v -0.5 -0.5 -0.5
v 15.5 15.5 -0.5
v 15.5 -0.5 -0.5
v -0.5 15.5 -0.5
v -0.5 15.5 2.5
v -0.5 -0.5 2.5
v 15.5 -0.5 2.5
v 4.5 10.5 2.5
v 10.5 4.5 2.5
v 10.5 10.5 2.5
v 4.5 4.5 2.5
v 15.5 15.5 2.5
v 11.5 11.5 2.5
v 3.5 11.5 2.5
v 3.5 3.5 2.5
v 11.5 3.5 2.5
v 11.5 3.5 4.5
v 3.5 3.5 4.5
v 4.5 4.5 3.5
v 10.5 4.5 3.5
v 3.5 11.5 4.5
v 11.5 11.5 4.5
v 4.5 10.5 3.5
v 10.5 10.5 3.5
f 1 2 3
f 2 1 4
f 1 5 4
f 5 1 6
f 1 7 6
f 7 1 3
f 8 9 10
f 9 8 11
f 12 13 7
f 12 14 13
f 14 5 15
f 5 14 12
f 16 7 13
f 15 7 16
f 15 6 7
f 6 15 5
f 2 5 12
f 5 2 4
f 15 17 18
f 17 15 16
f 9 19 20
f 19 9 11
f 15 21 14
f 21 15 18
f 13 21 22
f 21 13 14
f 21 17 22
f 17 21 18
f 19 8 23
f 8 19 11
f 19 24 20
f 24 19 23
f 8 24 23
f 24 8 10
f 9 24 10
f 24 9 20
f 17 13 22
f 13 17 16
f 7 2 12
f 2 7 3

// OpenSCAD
union() {
    translate([0, 0, 0]) color("brown") cube([1, 1, 1],center=true);
    translate([0, 0, 1]) color("brown") cube([1, 1, 1],center=true);
    translate([0, 0, 2]) color("brown") cube([1, 1, 1],center=true);
    translate([0, 1, 0]) color("brown") cube([1, 1, 1],center=true);
    translate([0, 1, 1]) color("brown") cube([1, 1, 1],center=true);
    translate([0, 1, 2]) color("brown") cube([1, 1, 1],center=true);
    translate([0, 2, 0]) color("brown") cube([1, 1, 1],center=true);
    translate([0, 2, 1]) color("brown") cube([1, 1, 1],center=true);
    translate([0, 2, 2]) color("brown") cube([1, 1, 1],center=true);
    translate([0, 3, 0]) color("brown") cube([1, 1, 1],center=true);
    translate([0, 3, 1]) color("brown") cube([1, 1, 1],center=true);
    translate([0, 3, 2]) color("brown") cube([1, 1, 1],center=true);
    translate([0, 4, 0]) color("brown") cube([1, 1, 1],center=true);
    translate([0, 4, 1]) color("brown") cube([1, 1, 1],center=true);
    translate([0, 4, 2]) color("brown") cube([1, 1, 1],center=true);
    translate([0, 5, 0]) color("brown") cube([1, 1, 1],center=true);
    translate([0, 5, 1]) color("brown") cube([1, 1, 1],center=true);
    translate([0, 5, 2]) color("brown") cube([1, 1, 1],center=true);
    translate([0, 6, 0]) color("brown") cube([1, 1, 1],center=true);
    translate([0, 6, 1]) color("brown") cube([1, 1, 1],center=true);
    translate([0, 6, 2]) color("brown") cube([1, 1, 1],center=true);
    translate([0, 7, 0]) color("brown") cube([1, 1, 1],center=true);
    translate([0, 7, 1]) color("brown") cube([1, 1, 1],center=true);
    translate([0, 7, 2]) color("brown") cube([1, 1, 1],center=true);
    translate([0, 8, 0]) color("brown") cube([1, 1, 1],center=true);
    translate([0, 8, 1]) color("brown") cube([1, 1, 1],center=true);
    translate([0, 8, 2]) color("brown") cube([1, 1, 1],center=true);
    translate([0, 9, 0]) color("brown") cube([1, 1, 1],center=true);
    translate([0, 9, 1]) color("brown") cube([1, 1, 1],center=true);
    translate([0, 9, 2]) color("brown") cube([1, 1, 1],center=true);
    translate([0, 10, 0]) color("brown") cube([1, 1, 1],center=true);
    translate([0, 10, 1]) color("brown") cube([1, 1, 1],center=true);
    translate([0, 10, 2]) color("brown") cube([1, 1, 1],center=true);
    translate([0, 11, 0]) color("brown") cube([1, 1, 1],center=true);
    translate([0, 11, 1]) color("brown") cube([1, 1, 1],center=true);
    translate([0, 11, 2]) color("brown") cube([1, 1, 1],center=true);
    translate([0, 12, 0]) color("brown") cube([1, 1, 1],center=true);
    translate([0, 12, 1]) color("brown") cube([1, 1, 1],center=true);
    translate([0, 12, 2]) color("brown") cube([1, 1, 1],center=true);
    translate([0, 13, 0]) color("brown") cube([1, 1, 1],center=true);
    translate([0, 13, 1]) color("brown") cube([1, 1, 1],center=true);
    translate([0, 13, 2]) color("brown") cube([1, 1, 1],center=true);
    translate([0, 14, 0]) color("brown") cube([1, 1, 1],center=true);
    translate([0, 14, 1]) color("brown") cube([1, 1, 1],center=true);
    translate([0, 14, 2]) color("brown") cube([1, 1, 1],center=true);
    translate([0, 15, 0]) color("brown") cube([1, 1, 1],center=true);
    translate([0, 15, 1]) color("brown") cube([1, 1, 1],center=true);
    translate([0, 15, 2]) color("brown") cube([1, 1, 1],center=true);
    translate([1, 0, 0]) color("brown") cube([1, 1, 1],center=true);
    translate([1, 0, 1]) color("brown") cube([1, 1, 1],center=true);
    translate([1, 0, 2]) color("brown") cube([1, 1, 1],center=true);
    translate([1, 1, 0]) color("brown") cube([1, 1, 1],center=true);
    translate([1, 1, 1]) color("brown") cube([1, 1, 1],center=true);
    translate([1, 1, 2]) color("brown") cube([1, 1, 1],center=true);
    translate([1, 2, 0]) color("brown") cube([1, 1, 1],center=true);
    translate([1, 2, 1]) color("brown") cube([1, 1, 1],center=true);
    translate([1, 2, 2]) color("brown") cube([1, 1, 1],center=true);
    translate([1, 3, 0]) color("brown") cube([1, 1, 1],center=true);
    translate([1, 3, 1]) color("brown") cube([1, 1, 1],center=true);
    translate([1, 3, 2]) color("brown") cube([1, 1, 1],center=true);
    translate([1, 4, 0]) color("brown") cube([1, 1, 1],center=true);
    translate([1, 4, 1]) color("brown") cube([1, 1, 1],center=true);
    translate([1, 4, 2]) color("brown") cube([1, 1, 1],center=true);
    translate([1, 5, 0]) color("brown") cube([1, 1, 1],center=true);
    translate([1, 5, 1]) color("brown") cube([1, 1, 1],center=true);
    translate([1, 5, 2]) color("brown") cube([1, 1, 1],center=true);
    translate([1, 6, 0]) color("brown") cube([1, 1, 1],center=true);
    translate([1, 6, 1]) color("brown") cube([1, 1, 1],center=true);
    translate([1, 6, 2]) color("brown") cube([1, 1, 1],center=true);
    translate([1, 7, 0]) color("brown") cube([1, 1, 1],center=true);
    translate([1, 7, 1]) color("brown") cube([1, 1, 1],center=true);
    translate([1, 7, 2]) color("brown") cube([1, 1, 1],center=true);
    translate([1, 8, 0]) color("brown") cube([1, 1, 1],center=true);
    translate([1, 8, 1]) color("brown") cube([1, 1, 1],center=true);
    translate([1, 8, 2]) color("brown") cube([1, 1, 1],center=true);
    translate([1, 9, 0]) color("brown") cube([1, 1, 1],center=true);
    translate([1, 9, 1]) color("brown") cube([1, 1, 1],center=true);
    translate([1, 9, 2]) color("brown") cube([1, 1, 1],center=true);
    translate([1, 10, 0]) color("brown") cube([1, 1, 1],center=true);
    translate([1, 10, 1]) color("brown") cube([1, 1, 1],center=true);
    translate([1, 10, 2]) color("brown") cube([1, 1, 1],center=true);
    translate([1, 11, 0]) color("brown") cube([1, 1, 1],center=true);
    translate([1, 11, 1]) color("brown") cube([1, 1, 1],center=true);
    translate([1, 11, 2]) color("brown") cube([1, 1, 1],center=true);
    translate([1, 12, 0]) color("brown") cube([1, 1, 1],center=true);
    translate([1, 12, 1]) color("brown") cube([1, 1, 1],center=true);
    translate([1, 12, 2]) color("brown") cube([1, 1, 1],center=true);
    translate([1, 13, 0]) color("brown") cube([1, 1, 1],center=true);
    translate([1, 13, 1]) color("brown") cube([1, 1, 1],center=true);
    translate([1, 13, 2]) color("brown") cube([1, 1, 1],center=true);
    translate([1, 14, 0]) color("brown") cube([1, 1, 1],center=true);
    translate([1, 14, 1]) color("brown") cube([1, 1, 1],center=true);
    translate([1, 14, 2]) color("brown") cube([1, 1, 1],center=true);
    translate([1, 15, 0]) color("brown") cube([1, 1, 1],center=true);
    translate([1, 15, 1]) color("brown") cube([1, 1, 1],center=true);
    translate([1, 15, 2]) color("brown") cube([1, 1, 1],center=true);
    translate([2, 0, 0]) color("brown") cube([1, 1, 1],center=true);
    translate([2, 0, 1]) color("brown") cube([1, 1, 1],center=true);
    translate([2, 0, 2]) color("brown") cube([1, 1, 1],center=true);
    translate([2, 1, 0]) color("brown") cube([1, 1, 1],center=true);
    translate([2, 1, 1]) color("brown") cube([1, 1, 1],center=true);
    translate([2, 1, 2]) color("brown") cube([1, 1, 1],center=true);
    translate([2, 2, 0]) color("brown") cube([1, 1, 1],center=true);
    translate([2, 2, 1]) color("brown") cube([1, 1, 1],center=true);
    translate([2, 2, 2]) color("brown") cube([1, 1, 1],center=true);
    translate([2, 3, 0]) color("brown") cube([1, 1, 1],center=true);
    translate([2, 3, 1]) color("brown") cube([1, 1, 1],center=true);
    translate([2, 3, 2]) color("brown") cube([1, 1, 1],center=true);
    translate([2, 4, 0]) color("brown") cube([1, 1, 1],center=true);
    translate([2, 4, 1]) color("brown") cube([1, 1, 1],center=true);
    translate([2, 4, 2]) color("brown") cube([1, 1, 1],center=true);
    translate([2, 5, 0]) color("brown") cube([1, 1, 1],center=true);
    translate([2, 5, 1]) color("brown") cube([1, 1, 1],center=true);
    translate([2, 5, 2]) color("brown") cube([1, 1, 1],center=true);
    translate([2, 6, 0]) color("brown") cube([1, 1, 1],center=true);
    translate([2, 6, 1]) color("brown") cube([1, 1, 1],center=true);
    translate([2, 6, 2]) color("brown") cube([1, 1, 1],center=true);
    translate([2, 7, 0]) color("brown") cube([1, 1, 1],center=true);
    translate([2, 7, 1]) color("brown") cube([1, 1, 1],center=true);
    translate([2, 7, 2]) color("brown") cube([1, 1, 1],center=true);
    translate([2, 8, 0]) color("brown") cube([1, 1, 1],center=true);
    translate([2, 8, 1]) color("brown") cube([1, 1, 1],center=true);
    translate([2, 8, 2]) color("brown") cube([1, 1, 1],center=true);
    translate([2, 9, 0]) color("brown") cube([1, 1, 1],center=true);
    translate([2, 9, 1]) color("brown") cube([1, 1, 1],center=true);
    translate([2, 9, 2]) color("brown") cube([1, 1, 1],center=true);
    translate([2, 10, 0]) color("brown") cube([1, 1, 1],center=true);
    translate([2, 10, 1]) color("brown") cube([1, 1, 1],center=true);
    translate([2, 10, 2]) color("brown") cube([1, 1, 1],center=true);
    translate([2, 11, 0]) color("brown") cube([1, 1, 1],center=true);
    translate([2, 11, 1]) color("brown") cube([1, 1, 1],center=true);
    translate([2, 11, 2]) color("brown") cube([1, 1, 1],center=true);
    translate([2, 12, 0]) color("brown") cube([1, 1, 1],center=true);
    translate([2, 12, 1]) color("brown") cube([1, 1, 1],center=true);
    translate([2, 12, 2]) color("brown") cube([1, 1, 1],center=true);
    translate([2, 13, 0]) color("brown") cube([1, 1, 1],center=true);
    translate([2, 13, 1]) color("brown") cube([1, 1, 1],center=true);
    translate([2, 13, 2]) color("brown") cube([1, 1, 1],center=true);
    translate([2, 14, 0]) color("brown") cube([1, 1, 1],center=true);
    translate([2, 14, 1]) color("brown") cube([1, 1, 1],center=true);
    translate([2, 14, 2]) color("brown") cube([1, 1, 1],center=true);
    translate([2, 15, 0]) color("brown") cube([1, 1, 1],center=true);
    translate([2, 15, 1]) color("brown") cube([1, 1, 1],center=true);
    translate([2, 15, 2]) color("brown") cube([1, 1, 1],center=true);
    translate([3, 0, 0]) color("brown") cube([1, 1, 1],center=true);
    translate([3, 0, 1]) color("brown") cube([1, 1, 1],center=true);
    translate([3, 0, 2]) color("brown") cube([1, 1, 1],center=true);
    translate([3, 1, 0]) color("brown") cube([1, 1, 1],center=true);
    translate([3, 1, 1]) color("brown") cube([1, 1, 1],center=true);
    translate([3, 1, 2]) color("brown") cube([1, 1, 1],center=true);
    translate([3, 2, 0]) color("brown") cube([1, 1, 1],center=true);
    translate([3, 2, 1]) color("brown") cube([1, 1, 1],center=true);
    translate([3, 2, 2]) color("brown") cube([1, 1, 1],center=true);
    translate([3, 3, 0]) color("brown") cube([1, 1, 1],center=true);
    translate([3, 3, 1]) color("brown") cube([1, 1, 1],center=true);
    translate([3, 3, 2]) color("brown") cube([1, 1, 1],center=true);
    translate([3, 4, 0]) color("brown") cube([1, 1, 1],center=true);
    translate([3, 4, 1]) color("brown") cube([1, 1, 1],center=true);
    translate([3, 4, 2]) color("brown") cube([1, 1, 1],center=true);
    translate([3, 5, 0]) color("brown") cube([1, 1, 1],center=true);
    translate([3, 5, 1]) color("brown") cube([1, 1, 1],center=true);
    translate([3, 5, 2]) color("brown") cube([1, 1, 1],center=true);
    translate([3, 6, 0]) color("brown") cube([1, 1, 1],center=true);
    translate([3, 6, 1]) color("brown") cube([1, 1, 1],center=true);
    translate([3, 6, 2]) color("brown") cube([1, 1, 1],center=true);
    translate([3, 7, 0]) color("brown") cube([1, 1, 1],center=true);
    translate([3, 7, 1]) color("brown") cube([1, 1, 1],center=true);
    translate([3, 7, 2]) color("brown") cube([1, 1, 1],center=true);
    translate([3, 8, 0]) color("brown") cube([1, 1, 1],center=true);
    translate([3, 8, 1]) color("brown") cube([1, 1, 1],center=true);
    translate([3, 8, 2]) color("brown") cube([1, 1, 1],center=true);
    translate([3, 9, 0]) color("brown") cube([1, 1, 1],center=true);
    translate([3, 9, 1]) color("brown") cube([1, 1, 1],center=true);
    translate([3, 9, 2]) color("brown") cube([1, 1, 1],center=true);
    translate([3, 10, 0]) color("brown") cube([1, 1, 1],center=true);
    translate([3, 10, 1]) color("brown") cube([1, 1, 1],center=true);
    translate([3, 10, 2]) color("brown") cube([1, 1, 1],center=true);
    translate([3, 11, 0]) color("brown") cube([1, 1, 1],center=true);
    translate([3, 11, 1]) color("brown") cube([1, 1, 1],center=true);
    translate([3, 11, 2]) color("brown") cube([1, 1, 1],center=true);
    translate([3, 12, 0]) color("brown") cube([1, 1, 1],center=true);
    translate([3, 12, 1]) color("brown") cube([1, 1, 1],center=true);
    translate([3, 12, 2]) color("brown") cube([1, 1, 1],center=true);
    translate([3, 13, 0]) color("brown") cube([1, 1, 1],center=true);
    translate([3, 13, 1]) color("brown") cube([1, 1, 1],center=true);
    translate([3, 13, 2]) color("brown") cube([1, 1, 1],center=true);
    translate([3, 14, 0]) color("brown") cube([1, 1, 1],center=true);
    translate([3, 14, 1]) color("brown") cube([1, 1, 1],center=true);
    translate([3, 14, 2]) color("brown") cube([1, 1, 1],center=true);
    translate([3, 15, 0]) color("brown") cube([1, 1, 1],center=true);
    translate([3, 15, 1]) color("brown") cube([1, 1, 1],center=true);
    translate([3, 15, 2]) color("brown") cube([1, 1, 1],center=true);
    translate([4, 0, 0]) color("brown") cube([1, 1, 1],center=true);
    translate([4, 0, 1]) color("brown") cube([1, 1, 1],center=true);
    translate([4, 0, 2]) color("brown") cube([1, 1, 1],center=true);
    translate([4, 1, 0]) color("brown") cube([1, 1, 1],center=true);
    translate([4, 1, 1]) color("brown") cube([1, 1, 1],center=true);
    translate([4, 1, 2]) color("brown") cube([1, 1, 1],center=true);
    translate([4, 2, 0]) color("brown") cube([1, 1, 1],center=true);
    translate([4, 2, 1]) color("brown") cube([1, 1, 1],center=true);
    translate([4, 2, 2]) color("brown") cube([1, 1, 1],center=true);
    translate([4, 3, 0]) color("brown") cube([1, 1, 1],center=true);
    translate([4, 3, 1]) color("brown") cube([1, 1, 1],center=true);
    translate([4, 3, 2]) color("brown") cube([1, 1, 1],center=true);
    translate([4, 4, 0]) color("brown") cube([1, 1, 1],center=true);
    translate([4, 4, 1]) color("brown") cube([1, 1, 1],center=true);
    translate([4, 4, 2]) color("brown") cube([1, 1, 1],center=true);
    translate([4, 4, 3]) color("brown") cube([1, 1, 1],center=true);
    translate([4, 4, 4]) color("brown") cube([1, 1, 1],center=true);
    translate([4, 5, 0]) color("brown") cube([1, 1, 1],center=true);
    translate([4, 5, 1]) color("brown") cube([1, 1, 1],center=true);
    translate([4, 5, 2]) color("brown") cube([1, 1, 1],center=true);
    translate([4, 5, 3]) color("brown") cube([1, 1, 1],center=true);
    translate([4, 5, 4]) color("brown") cube([1, 1, 1],center=true);
    translate([4, 6, 0]) color("brown") cube([1, 1, 1],center=true);
    translate([4, 6, 1]) color("brown") cube([1, 1, 1],center=true);
    translate([4, 6, 2]) color("brown") cube([1, 1, 1],center=true);
    translate([4, 6, 3]) color("brown") cube([1, 1, 1],center=true);
    translate([4, 6, 4]) color("brown") cube([1, 1, 1],center=true);
    translate([4, 7, 0]) color("brown") cube([1, 1, 1],center=true);
    translate([4, 7, 1]) color("brown") cube([1, 1, 1],center=true);
    translate([4, 7, 2]) color("brown") cube([1, 1, 1],center=true);
    translate([4, 7, 3]) color("brown") cube([1, 1, 1],center=true);
    translate([4, 7, 4]) color("brown") cube([1, 1, 1],center=true);
    translate([4, 8, 0]) color("brown") cube([1, 1, 1],center=true);
    translate([4, 8, 1]) color("brown") cube([1, 1, 1],center=true);
    translate([4, 8, 2]) color("brown") cube([1, 1, 1],center=true);
    translate([4, 8, 3]) color("brown") cube([1, 1, 1],center=true);
    translate([4, 8, 4]) color("brown") cube([1, 1, 1],center=true);
    translate([4, 9, 0]) color("brown") cube([1, 1, 1],center=true);
    translate([4, 9, 1]) color("brown") cube([1, 1, 1],center=true);
    translate([4, 9, 2]) color("brown") cube([1, 1, 1],center=true);
    translate([4, 9, 3]) color("brown") cube([1, 1, 1],center=true);
    translate([4, 9, 4]) color("brown") cube([1, 1, 1],center=true);
    translate([4, 10, 0]) color("brown") cube([1, 1, 1],center=true);
    translate([4, 10, 1]) color("brown") cube([1, 1, 1],center=true);
    translate([4, 10, 2]) color("brown") cube([1, 1, 1],center=true);
    translate([4, 10, 3]) color("brown") cube([1, 1, 1],center=true);
    translate([4, 10, 4]) color("brown") cube([1, 1, 1],center=true);
    translate([4, 11, 0]) color("brown") cube([1, 1, 1],center=true);
    translate([4, 11, 1]) color("brown") cube([1, 1, 1],center=true);
    translate([4, 11, 2]) color("brown") cube([1, 1, 1],center=true);
    translate([4, 11, 3]) color("brown") cube([1, 1, 1],center=true);
    translate([4, 11, 4]) color("brown") cube([1, 1, 1],center=true);
    translate([4, 12, 0]) color("brown") cube([1, 1, 1],center=true);
    translate([4, 12, 1]) color("brown") cube([1, 1, 1],center=true);
    translate([4, 12, 2]) color("brown") cube([1, 1, 1],center=true);
    translate([4, 13, 0]) color("brown") cube([1, 1, 1],center=true);
    translate([4, 13, 1]) color("brown") cube([1, 1, 1],center=true);
    translate([4, 13, 2]) color("brown") cube([1, 1, 1],center=true);
    translate([4, 14, 0]) color("brown") cube([1, 1, 1],center=true);
    translate([4, 14, 1]) color("brown") cube([1, 1, 1],center=true);
    translate([4, 14, 2]) color("brown") cube([1, 1, 1],center=true);
    translate([4, 15, 0]) color("brown") cube([1, 1, 1],center=true);
    translate([4, 15, 1]) color("brown") cube([1, 1, 1],center=true);
    translate([4, 15, 2]) color("brown") cube([1, 1, 1],center=true);
    translate([5, 0, 0]) color("brown") cube([1, 1, 1],center=true);
    translate([5, 0, 1]) color("brown") cube([1, 1, 1],center=true);
    translate([5, 0, 2]) color("brown") cube([1, 1, 1],center=true);
    translate([5, 1, 0]) color("brown") cube([1, 1, 1],center=true);
    translate([5, 1, 1]) color("brown") cube([1, 1, 1],center=true);
    translate([5, 1, 2]) color("brown") cube([1, 1, 1],center=true);
    translate([5, 2, 0]) color("brown") cube([1, 1, 1],center=true);
    translate([5, 2, 1]) color("brown") cube([1, 1, 1],center=true);
    translate([5, 2, 2]) color("brown") cube([1, 1, 1],center=true);
    translate([5, 3, 0]) color("brown") cube([1, 1, 1],center=true);
    translate([5, 3, 1]) color("brown") cube([1, 1, 1],center=true);
    translate([5, 3, 2]) color("brown") cube([1, 1, 1],center=true);
    translate([5, 4, 0]) color("brown") cube([1, 1, 1],center=true);
    translate([5, 4, 1]) color("brown") cube([1, 1, 1],center=true);
    translate([5, 4, 2]) color("brown") cube([1, 1, 1],center=true);
    translate([5, 4, 3]) color("brown") cube([1, 1, 1],center=true);
    translate([5, 4, 4]) color("brown") cube([1, 1, 1],center=true);
    translate([5, 5, 0]) color("brown") cube([1, 1, 1],center=true);
    translate([5, 5, 1]) color("brown") cube([1, 1, 1],center=true);
    translate([5, 5, 2]) color("brown") cube([1, 1, 1],center=true);
    translate([5, 5, 4]) color("brown") cube([1, 1, 1],center=true);
    translate([5, 6, 0]) color("brown") cube([1, 1, 1],center=true);
    translate([5, 6, 1]) color("brown") cube([1, 1, 1],center=true);
    translate([5, 6, 2]) color("brown") cube([1, 1, 1],center=true);
    translate([5, 6, 4]) color("brown") cube([1, 1, 1],center=true);
    translate([5, 7, 0]) color("brown") cube([1, 1, 1],center=true);
    translate([5, 7, 1]) color("brown") cube([1, 1, 1],center=true);
    translate([5, 7, 2]) color("brown") cube([1, 1, 1],center=true);
    translate([5, 7, 4]) color("brown") cube([1, 1, 1],center=true);
    translate([5, 8, 0]) color("brown") cube([1, 1, 1],center=true);
    translate([5, 8, 1]) color("brown") cube([1, 1, 1],center=true);
    translate([5, 8, 2]) color("brown") cube([1, 1, 1],center=true);
    translate([5, 8, 4]) color("brown") cube([1, 1, 1],center=true);
    translate([5, 9, 0]) color("brown") cube([1, 1, 1],center=true);
    translate([5, 9, 1]) color("brown") cube([1, 1, 1],center=true);
    translate([5, 9, 2]) color("brown") cube([1, 1, 1],center=true);
    translate([5, 9, 4]) color("brown") cube([1, 1, 1],center=true);
    translate([5, 10, 0]) color("brown") cube([1, 1, 1],center=true);
    translate([5, 10, 1]) color("brown") cube([1, 1, 1],center=true);
    translate([5, 10, 2]) color("brown") cube([1, 1, 1],center=true);
    translate([5, 10, 4]) color("brown") cube([1, 1, 1],center=true);
    translate([5, 11, 0]) color("brown") cube([1, 1, 1],center=true);
    translate([5, 11, 1]) color("brown") cube([1, 1, 1],center=true);
    translate([5, 11, 2]) color("brown") cube([1, 1, 1],center=true);
    translate([5, 11, 3]) color("brown") cube([1, 1, 1],center=true);
    translate([5, 11, 4]) color("brown") cube([1, 1, 1],center=true);
    translate([5, 12, 0]) color("brown") cube([1, 1, 1],center=true);
    translate([5, 12, 1]) color("brown") cube([1, 1, 1],center=true);
    translate([5, 12, 2]) color("brown") cube([1, 1, 1],center=true);
    translate([5, 13, 0]) color("brown") cube([1, 1, 1],center=true);
    translate([5, 13, 1]) color("brown") cube([1, 1, 1],center=true);
    translate([5, 13, 2]) color("brown") cube([1, 1, 1],center=true);
    translate([5, 14, 0]) color("brown") cube([1, 1, 1],center=true);
    translate([5, 14, 1]) color("brown") cube([1, 1, 1],center=true);
    translate([5, 14, 2]) color("brown") cube([1, 1, 1],center=true);
    translate([5, 15, 0]) color("brown") cube([1, 1, 1],center=true);
    translate([5, 15, 1]) color("brown") cube([1, 1, 1],center=true);
    translate([5, 15, 2]) color("brown") cube([1, 1, 1],center=true);
    translate([6, 0, 0]) color("brown") cube([1, 1, 1],center=true);
    translate([6, 0, 1]) color("brown") cube([1, 1, 1],center=true);
    translate([6, 0, 2]) color("brown") cube([1, 1, 1],center=true);
    translate([6, 1, 0]) color("brown") cube([1, 1, 1],center=true);
    translate([6, 1, 1]) color("brown") cube([1, 1, 1],center=true);
    translate([6, 1, 2]) color("brown") cube([1, 1, 1],center=true);
    translate([6, 2, 0]) color("brown") cube([1, 1, 1],center=true);
    translate([6, 2, 1]) color("brown") cube([1, 1, 1],center=true);
    translate([6, 2, 2]) color("brown") cube([1, 1, 1],center=true);
    translate([6, 3, 0]) color("brown") cube([1, 1, 1],center=true);
    translate([6, 3, 1]) color("brown") cube([1, 1, 1],center=true);
    translate([6, 3, 2]) color("brown") cube([1, 1, 1],center=true);
    translate([6, 4, 0]) color("brown") cube([1, 1, 1],center=true);
    translate([6, 4, 1]) color("brown") cube([1, 1, 1],center=true);
    translate([6, 4, 2]) color("brown") cube([1, 1, 1],center=true);
    translate([6, 4, 3]) color("brown") cube([1, 1, 1],center=true);
    translate([6, 4, 4]) color("brown") cube([1, 1, 1],center=true);
    translate([6, 5, 0]) color("brown") cube([1, 1, 1],center=true);
    translate([6, 5, 1]) color("brown") cube([1, 1, 1],center=true);
    translate([6, 5, 2]) color("brown") cube([1, 1, 1],center=true);
    translate([6, 5, 4]) color("brown") cube([1, 1, 1],center=true);
    translate([6, 6, 0]) color("brown") cube([1, 1, 1],center=true);
    translate([6, 6, 1]) color("brown") cube([1, 1, 1],center=true);
    translate([6, 6, 2]) color("brown") cube([1, 1, 1],center=true);
    translate([6, 6, 4]) color("brown") cube([1, 1, 1],center=true);
    translate([6, 7, 0]) color("brown") cube([1, 1, 1],center=true);
    translate([6, 7, 1]) color("brown") cube([1, 1, 1],center=true);
    translate([6, 7, 2]) color("brown") cube([1, 1, 1],center=true);
    translate([6, 7, 4]) color("brown") cube([1, 1, 1],center=true);
    translate([6, 8, 0]) color("brown") cube([1, 1, 1],center=true);
    translate([6, 8, 1]) color("brown") cube([1, 1, 1],center=true);
    translate([6, 8, 2]) color("brown") cube([1, 1, 1],center=true);
    translate([6, 8, 4]) color("brown") cube([1, 1, 1],center=true);
    translate([6, 9, 0]) color("brown") cube([1, 1, 1],center=true);
    translate([6, 9, 1]) color("brown") cube([1, 1, 1],center=true);
    translate([6, 9, 2]) color("brown") cube([1, 1, 1],center=true);
    translate([6, 9, 4]) color("brown") cube([1, 1, 1],center=true);
    translate([6, 10, 0]) color("brown") cube([1, 1, 1],center=true);
    translate([6, 10, 1]) color("brown") cube([1, 1, 1],center=true);
    translate([6, 10, 2]) color("brown") cube([1, 1, 1],center=true);
    translate([6, 10, 4]) color("brown") cube([1, 1, 1],center=true);
    translate([6, 11, 0]) color("brown") cube([1, 1, 1],center=true);
    translate([6, 11, 1]) color("brown") cube([1, 1, 1],center=true);
    translate([6, 11, 2]) color("brown") cube([1, 1, 1],center=true);
    translate([6, 11, 3]) color("brown") cube([1, 1, 1],center=true);
    translate([6, 11, 4]) color("brown") cube([1, 1, 1],center=true);
    translate([6, 12, 0]) color("brown") cube([1, 1, 1],center=true);
    translate([6, 12, 1]) color("brown") cube([1, 1, 1],center=true);
    translate([6, 12, 2]) color("brown") cube([1, 1, 1],center=true);
    translate([6, 13, 0]) color("brown") cube([1, 1, 1],center=true);
    translate([6, 13, 1]) color("brown") cube([1, 1, 1],center=true);
    translate([6, 13, 2]) color("brown") cube([1, 1, 1],center=true);
    translate([6, 14, 0]) color("brown") cube([1, 1, 1],center=true);
    translate([6, 14, 1]) color("brown") cube([1, 1, 1],center=true);
    translate([6, 14, 2]) color("brown") cube([1, 1, 1],center=true);
    translate([6, 15, 0]) color("brown") cube([1, 1, 1],center=true);
    translate([6, 15, 1]) color("brown") cube([1, 1, 1],center=true);
    translate([6, 15, 2]) color("brown") cube([1, 1, 1],center=true);
    translate([7, 0, 0]) color("brown") cube([1, 1, 1],center=true);
    translate([7, 0, 1]) color("brown") cube([1, 1, 1],center=true);
    translate([7, 0, 2]) color("brown") cube([1, 1, 1],center=true);
    translate([7, 1, 0]) color("brown") cube([1, 1, 1],center=true);
    translate([7, 1, 1]) color("brown") cube([1, 1, 1],center=true);
    translate([7, 1, 2]) color("brown") cube([1, 1, 1],center=true);
    translate([7, 2, 0]) color("brown") cube([1, 1, 1],center=true);
    translate([7, 2, 1]) color("brown") cube([1, 1, 1],center=true);
    translate([7, 2, 2]) color("brown") cube([1, 1, 1],center=true);
    translate([7, 3, 0]) color("brown") cube([1, 1, 1],center=true);
    translate([7, 3, 1]) color("brown") cube([1, 1, 1],center=true);
    translate([7, 3, 2]) color("brown") cube([1, 1, 1],center=true);
    translate([7, 4, 0]) color("brown") cube([1, 1, 1],center=true);
    translate([7, 4, 1]) color("brown") cube([1, 1, 1],center=true);
    translate([7, 4, 2]) color("brown") cube([1, 1, 1],center=true);
    translate([7, 4, 3]) color("brown") cube([1, 1, 1],center=true);
    translate([7, 4, 4]) color("brown") cube([1, 1, 1],center=true);
    translate([7, 5, 0]) color("brown") cube([1, 1, 1],center=true);
    translate([7, 5, 1]) color("brown") cube([1, 1, 1],center=true);
    translate([7, 5, 2]) color("brown") cube([1, 1, 1],center=true);
    translate([7, 5, 4]) color("brown") cube([1, 1, 1],center=true);
    translate([7, 6, 0]) color("brown") cube([1, 1, 1],center=true);
    translate([7, 6, 1]) color("brown") cube([1, 1, 1],center=true);
    translate([7, 6, 2]) color("brown") cube([1, 1, 1],center=true);
    translate([7, 6, 4]) color("brown") cube([1, 1, 1],center=true);
    translate([7, 7, 0]) color("brown") cube([1, 1, 1],center=true);
    translate([7, 7, 1]) color("brown") cube([1, 1, 1],center=true);
    translate([7, 7, 2]) color("brown") cube([1, 1, 1],center=true);
    translate([7, 7, 4]) color("brown") cube([1, 1, 1],center=true);
    translate([7, 8, 0]) color("brown") cube([1, 1, 1],center=true);
    translate([7, 8, 1]) color("brown") cube([1, 1, 1],center=true);
    translate([7, 8, 2]) color("brown") cube([1, 1, 1],center=true);
    translate([7, 8, 4]) color("brown") cube([1, 1, 1],center=true);
    translate([7, 9, 0]) color("brown") cube([1, 1, 1],center=true);
    translate([7, 9, 1]) color("brown") cube([1, 1, 1],center=true);
    translate([7, 9, 2]) color("brown") cube([1, 1, 1],center=true);
    translate([7, 9, 4]) color("brown") cube([1, 1, 1],center=true);
    translate([7, 10, 0]) color("brown") cube([1, 1, 1],center=true);
    translate([7, 10, 1]) color("brown") cube([1, 1, 1],center=true);
    translate([7, 10, 2]) color("brown") cube([1, 1, 1],center=true);
    translate([7, 10, 4]) color("brown") cube([1, 1, 1],center=true);
    translate([7, 11, 0]) color("brown") cube([1, 1, 1],center=true);
    translate([7, 11, 1]) color("brown") cube([1, 1, 1],center=true);
    translate([7, 11, 2]) color("brown") cube([1, 1, 1],center=true);
    translate([7, 11, 3]) color("brown") cube([1, 1, 1],center=true);
    translate([7, 11, 4]) color("brown") cube([1, 1, 1],center=true);
    translate([7, 12, 0]) color("brown") cube([1, 1, 1],center=true);
    translate([7, 12, 1]) color("brown") cube([1, 1, 1],center=true);
    translate([7, 12, 2]) color("brown") cube([1, 1, 1],center=true);
    translate([7, 13, 0]) color("brown") cube([1, 1, 1],center=true);
    translate([7, 13, 1]) color("brown") cube([1, 1, 1],center=true);
    translate([7, 13, 2]) color("brown") cube([1, 1, 1],center=true);
    translate([7, 14, 0]) color("brown") cube([1, 1, 1],center=true);
    translate([7, 14, 1]) color("brown") cube([1, 1, 1],center=true);
    translate([7, 14, 2]) color("brown") cube([1, 1, 1],center=true);
    translate([7, 15, 0]) color("brown") cube([1, 1, 1],center=true);
    translate([7, 15, 1]) color("brown") cube([1, 1, 1],center=true);
    translate([7, 15, 2]) color("brown") cube([1, 1, 1],center=true);
    translate([8, 0, 0]) color("brown") cube([1, 1, 1],center=true);
    translate([8, 0, 1]) color("brown") cube([1, 1, 1],center=true);
    translate([8, 0, 2]) color("brown") cube([1, 1, 1],center=true);
    translate([8, 1, 0]) color("brown") cube([1, 1, 1],center=true);
    translate([8, 1, 1]) color("brown") cube([1, 1, 1],center=true);
    translate([8, 1, 2]) color("brown") cube([1, 1, 1],center=true);
    translate([8, 2, 0]) color("brown") cube([1, 1, 1],center=true);
    translate([8, 2, 1]) color("brown") cube([1, 1, 1],center=true);
    translate([8, 2, 2]) color("brown") cube([1, 1, 1],center=true);
    translate([8, 3, 0]) color("brown") cube([1, 1, 1],center=true);
    translate([8, 3, 1]) color("brown") cube([1, 1, 1],center=true);
    translate([8, 3, 2]) color("brown") cube([1, 1, 1],center=true);
    translate([8, 4, 0]) color("brown") cube([1, 1, 1],center=true);
    translate([8, 4, 1]) color("brown") cube([1, 1, 1],center=true);
    translate([8, 4, 2]) color("brown") cube([1, 1, 1],center=true);
    translate([8, 4, 3]) color("brown") cube([1, 1, 1],center=true);
    translate([8, 4, 4]) color("brown") cube([1, 1, 1],center=true);
    translate([8, 5, 0]) color("brown") cube([1, 1, 1],center=true);
    translate([8, 5, 1]) color("brown") cube([1, 1, 1],center=true);
    translate([8, 5, 2]) color("brown") cube([1, 1, 1],center=true);
    translate([8, 5, 4]) color("brown") cube([1, 1, 1],center=true);
    translate([8, 6, 0]) color("brown") cube([1, 1, 1],center=true);
    translate([8, 6, 1]) color("brown") cube([1, 1, 1],center=true);
    translate([8, 6, 2]) color("brown") cube([1, 1, 1],center=true);
    translate([8, 6, 4]) color("brown") cube([1, 1, 1],center=true);
    translate([8, 7, 0]) color("brown") cube([1, 1, 1],center=true);
    translate([8, 7, 1]) color("brown") cube([1, 1, 1],center=true);
    translate([8, 7, 2]) color("brown") cube([1, 1, 1],center=true);
    translate([8, 7, 4]) color("brown") cube([1, 1, 1],center=true);
    translate([8, 8, 0]) color("brown") cube([1, 1, 1],center=true);
    translate([8, 8, 1]) color("brown") cube([1, 1, 1],center=true);
    translate([8, 8, 2]) color("brown") cube([1, 1, 1],center=true);
    translate([8, 8, 4]) color("brown") cube([1, 1, 1],center=true);
    translate([8, 9, 0]) color("brown") cube([1, 1, 1],center=true);
    translate([8, 9, 1]) color("brown") cube([1, 1, 1],center=true);
    translate([8, 9, 2]) color("brown") cube([1, 1, 1],center=true);
    translate([8, 9, 4]) color("brown") cube([1, 1, 1],center=true);
    translate([8, 10, 0]) color("brown") cube([1, 1, 1],center=true);
    translate([8, 10, 1]) color("brown") cube([1, 1, 1],center=true);
    translate([8, 10, 2]) color("brown") cube([1, 1, 1],center=true);
    translate([8, 10, 4]) color("brown") cube([1, 1, 1],center=true);
    translate([8, 11, 0]) color("brown") cube([1, 1, 1],center=true);
    translate([8, 11, 1]) color("brown") cube([1, 1, 1],center=true);
    translate([8, 11, 2]) color("brown") cube([1, 1, 1],center=true);
    translate([8, 11, 3]) color("brown") cube([1, 1, 1],center=true);
    translate([8, 11, 4]) color("brown") cube([1, 1, 1],center=true);
    translate([8, 12, 0]) color("brown") cube([1, 1, 1],center=true);
    translate([8, 12, 1]) color("brown") cube([1, 1, 1],center=true);
    translate([8, 12, 2]) color("brown") cube([1, 1, 1],center=true);
    translate([8, 13, 0]) color("brown") cube([1, 1, 1],center=true);
    translate([8, 13, 1]) color("brown") cube([1, 1, 1],center=true);
    translate([8, 13, 2]) color("brown") cube([1, 1, 1],center=true);
    translate([8, 14, 0]) color("brown") cube([1, 1, 1],center=true);
    translate([8, 14, 1]) color("brown") cube([1, 1, 1],center=true);
    translate([8, 14, 2]) color("brown") cube([1, 1, 1],center=true);
    translate([8, 15, 0]) color("brown") cube([1, 1, 1],center=true);
    translate([8, 15, 1]) color("brown") cube([1, 1, 1],center=true);
    translate([8, 15, 2]) color("brown") cube([1, 1, 1],center=true);
    translate([9, 0, 0]) color("brown") cube([1, 1, 1],center=true);
    translate([9, 0, 1]) color("brown") cube([1, 1, 1],center=true);
    translate([9, 0, 2]) color("brown") cube([1, 1, 1],center=true);
    translate([9, 1, 0]) color("brown") cube([1, 1, 1],center=true);
    translate([9, 1, 1]) color("brown") cube([1, 1, 1],center=true);
    translate([9, 1, 2]) color("brown") cube([1, 1, 1],center=true);
    translate([9, 2, 0]) color("brown") cube([1, 1, 1],center=true);
    translate([9, 2, 1]) color("brown") cube([1, 1, 1],center=true);
    translate([9, 2, 2]) color("brown") cube([1, 1, 1],center=true);
    translate([9, 3, 0]) color("brown") cube([1, 1, 1],center=true);
    translate([9, 3, 1]) color("brown") cube([1, 1, 1],center=true);
    translate([9, 3, 2]) color("brown") cube([1, 1, 1],center=true);
    translate([9, 4, 0]) color("brown") cube([1, 1, 1],center=true);
    translate([9, 4, 1]) color("brown") cube([1, 1, 1],center=true);
    translate([9, 4, 2]) color("brown") cube([1, 1, 1],center=true);
    translate([9, 4, 3]) color("brown") cube([1, 1, 1],center=true);
    translate([9, 4, 4]) color("brown") cube([1, 1, 1],center=true);
    translate([9, 5, 0]) color("brown") cube([1, 1, 1],center=true);
    translate([9, 5, 1]) color("brown") cube([1, 1, 1],center=true);
    translate([9, 5, 2]) color("brown") cube([1, 1, 1],center=true);
    translate([9, 5, 4]) color("brown") cube([1, 1, 1],center=true);
    translate([9, 6, 0]) color("brown") cube([1, 1, 1],center=true);
    translate([9, 6, 1]) color("brown") cube([1, 1, 1],center=true);
    translate([9, 6, 2]) color("brown") cube([1, 1, 1],center=true);
    translate([9, 6, 4]) color("brown") cube([1, 1, 1],center=true);
    translate([9, 7, 0]) color("brown") cube([1, 1, 1],center=true);
    translate([9, 7, 1]) color("brown") cube([1, 1, 1],center=true);
    translate([9, 7, 2]) color("brown") cube([1, 1, 1],center=true);
    translate([9, 7, 4]) color("brown") cube([1, 1, 1],center=true);
    translate([9, 8, 0]) color("brown") cube([1, 1, 1],center=true);
    translate([9, 8, 1]) color("brown") cube([1, 1, 1],center=true);
    translate([9, 8, 2]) color("brown") cube([1, 1, 1],center=true);
    translate([9, 8, 4]) color("brown") cube([1, 1, 1],center=true);
    translate([9, 9, 0]) color("brown") cube([1, 1, 1],center=true);
    translate([9, 9, 1]) color("brown") cube([1, 1, 1],center=true);
    translate([9, 9, 2]) color("brown") cube([1, 1, 1],center=true);
    translate([9, 9, 4]) color("brown") cube([1, 1, 1],center=true);
    translate([9, 10, 0]) color("brown") cube([1, 1, 1],center=true);
    translate([9, 10, 1]) color("brown") cube([1, 1, 1],center=true);
    translate([9, 10, 2]) color("brown") cube([1, 1, 1],center=true);
    translate([9, 10, 4]) color("brown") cube([1, 1, 1],center=true);
    translate([9, 11, 0]) color("brown") cube([1, 1, 1],center=true);
    translate([9, 11, 1]) color("brown") cube([1, 1, 1],center=true);
    translate([9, 11, 2]) color("brown") cube([1, 1, 1],center=true);
    translate([9, 11, 3]) color("brown") cube([1, 1, 1],center=true);
    translate([9, 11, 4]) color("brown") cube([1, 1, 1],center=true);
    translate([9, 12, 0]) color("brown") cube([1, 1, 1],center=true);
    translate([9, 12, 1]) color("brown") cube([1, 1, 1],center=true);
    translate([9, 12, 2]) color("brown") cube([1, 1, 1],center=true);
    translate([9, 13, 0]) color("brown") cube([1, 1, 1],center=true);
    translate([9, 13, 1]) color("brown") cube([1, 1, 1],center=true);
    translate([9, 13, 2]) color("brown") cube([1, 1, 1],center=true);
    translate([9, 14, 0]) color("brown") cube([1, 1, 1],center=true);
    translate([9, 14, 1]) color("brown") cube([1, 1, 1],center=true);
    translate([9, 14, 2]) color("brown") cube([1, 1, 1],center=true);
    translate([9, 15, 0]) color("brown") cube([1, 1, 1],center=true);
    translate([9, 15, 1]) color("brown") cube([1, 1, 1],center=true);
    translate([9, 15, 2]) color("brown") cube([1, 1, 1],center=true);
    translate([10, 0, 0]) color("brown") cube([1, 1, 1],center=true);
    translate([10, 0, 1]) color("brown") cube([1, 1, 1],center=true);
    translate([10, 0, 2]) color("brown") cube([1, 1, 1],center=true);
    translate([10, 1, 0]) color("brown") cube([1, 1, 1],center=true);
    translate([10, 1, 1]) color("brown") cube([1, 1, 1],center=true);
    translate([10, 1, 2]) color("brown") cube([1, 1, 1],center=true);
    translate([10, 2, 0]) color("brown") cube([1, 1, 1],center=true);
    translate([10, 2, 1]) color("brown") cube([1, 1, 1],center=true);
    translate([10, 2, 2]) color("brown") cube([1, 1, 1],center=true);
    translate([10, 3, 0]) color("brown") cube([1, 1, 1],center=true);
    translate([10, 3, 1]) color("brown") cube([1, 1, 1],center=true);
    translate([10, 3, 2]) color("brown") cube([1, 1, 1],center=true);
    translate([10, 4, 0]) color("brown") cube([1, 1, 1],center=true);
    translate([10, 4, 1]) color("brown") cube([1, 1, 1],center=true);
    translate([10, 4, 2]) color("brown") cube([1, 1, 1],center=true);
    translate([10, 4, 3]) color("brown") cube([1, 1, 1],center=true);
    translate([10, 4, 4]) color("brown") cube([1, 1, 1],center=true);
    translate([10, 5, 0]) color("brown") cube([1, 1, 1],center=true);
    translate([10, 5, 1]) color("brown") cube([1, 1, 1],center=true);
    translate([10, 5, 2]) color("brown") cube([1, 1, 1],center=true);
    translate([10, 5, 4]) color("brown") cube([1, 1, 1],center=true);
    translate([10, 6, 0]) color("brown") cube([1, 1, 1],center=true);
    translate([10, 6, 1]) color("brown") cube([1, 1, 1],center=true);
    translate([10, 6, 2]) color("brown") cube([1, 1, 1],center=true);
    translate([10, 6, 4]) color("brown") cube([1, 1, 1],center=true);
    translate([10, 7, 0]) color("brown") cube([1, 1, 1],center=true);
    translate([10, 7, 1]) color("brown") cube([1, 1, 1],center=true);
    translate([10, 7, 2]) color("brown") cube([1, 1, 1],center=true);
    translate([10, 7, 4]) color("brown") cube([1, 1, 1],center=true);
    translate([10, 8, 0]) color("brown") cube([1, 1, 1],center=true);
    translate([10, 8, 1]) color("brown") cube([1, 1, 1],center=true);
    translate([10, 8, 2]) color("brown") cube([1, 1, 1],center=true);
    translate([10, 8, 4]) color("brown") cube([1, 1, 1],center=true);
    translate([10, 9, 0]) color("brown") cube([1, 1, 1],center=true);
    translate([10, 9, 1]) color("brown") cube([1, 1, 1],center=true);
    translate([10, 9, 2]) color("brown") cube([1, 1, 1],center=true);
    translate([10, 9, 4]) color("brown") cube([1, 1, 1],center=true);
    translate([10, 10, 0]) color("brown") cube([1, 1, 1],center=true);
    translate([10, 10, 1]) color("brown") cube([1, 1, 1],center=true);
    translate([10, 10, 2]) color("brown") cube([1, 1, 1],center=true);
    translate([10, 10, 4]) color("brown") cube([1, 1, 1],center=true);
    translate([10, 11, 0]) color("brown") cube([1, 1, 1],center=true);
    translate([10, 11, 1]) color("brown") cube([1, 1, 1],center=true);
    translate([10, 11, 2]) color("brown") cube([1, 1, 1],center=true);
    translate([10, 11, 3]) color("brown") cube([1, 1, 1],center=true);
    translate([10, 11, 4]) color("brown") cube([1, 1, 1],center=true);
    translate([10, 12, 0]) color("brown") cube([1, 1, 1],center=true);
    translate([10, 12, 1]) color("brown") cube([1, 1, 1],center=true);
    translate([10, 12, 2]) color("brown") cube([1, 1, 1],center=true);
    translate([10, 13, 0]) color("brown") cube([1, 1, 1],center=true);
    translate([10, 13, 1]) color("brown") cube([1, 1, 1],center=true);
    translate([10, 13, 2]) color("brown") cube([1, 1, 1],center=true);
    translate([10, 14, 0]) color("brown") cube([1, 1, 1],center=true);
    translate([10, 14, 1]) color("brown") cube([1, 1, 1],center=true);
    translate([10, 14, 2]) color("brown") cube([1, 1, 1],center=true);
    translate([10, 15, 0]) color("brown") cube([1, 1, 1],center=true);
    translate([10, 15, 1]) color("brown") cube([1, 1, 1],center=true);
    translate([10, 15, 2]) color("brown") cube([1, 1, 1],center=true);
    translate([11, 0, 0]) color("brown") cube([1, 1, 1],center=true);
    translate([11, 0, 1]) color("brown") cube([1, 1, 1],center=true);
    translate([11, 0, 2]) color("brown") cube([1, 1, 1],center=true);
    translate([11, 1, 0]) color("brown") cube([1, 1, 1],center=true);
    translate([11, 1, 1]) color("brown") cube([1, 1, 1],center=true);
    translate([11, 1, 2]) color("brown") cube([1, 1, 1],center=true);
    translate([11, 2, 0]) color("brown") cube([1, 1, 1],center=true);
    translate([11, 2, 1]) color("brown") cube([1, 1, 1],center=true);
    translate([11, 2, 2]) color("brown") cube([1, 1, 1],center=true);
    translate([11, 3, 0]) color("brown") cube([1, 1, 1],center=true);
    translate([11, 3, 1]) color("brown") cube([1, 1, 1],center=true);
    translate([11, 3, 2]) color("brown") cube([1, 1, 1],center=true);
    translate([11, 4, 0]) color("brown") cube([1, 1, 1],center=true);
    translate([11, 4, 1]) color("brown") cube([1, 1, 1],center=true);
    translate([11, 4, 2]) color("brown") cube([1, 1, 1],center=true);
    translate([11, 4, 3]) color("brown") cube([1, 1, 1],center=true);
    translate([11, 4, 4]) color("brown") cube([1, 1, 1],center=true);
    translate([11, 5, 0]) color("brown") cube([1, 1, 1],center=true);
    translate([11, 5, 1]) color("brown") cube([1, 1, 1],center=true);
    translate([11, 5, 2]) color("brown") cube([1, 1, 1],center=true);
    translate([11, 5, 3]) color("brown") cube([1, 1, 1],center=true);
    translate([11, 5, 4]) color("brown") cube([1, 1, 1],center=true);
    translate([11, 6, 0]) color("brown") cube([1, 1, 1],center=true);
    translate([11, 6, 1]) color("brown") cube([1, 1, 1],center=true);
    translate([11, 6, 2]) color("brown") cube([1, 1, 1],center=true);
    translate([11, 6, 3]) color("brown") cube([1, 1, 1],center=true);
    translate([11, 6, 4]) color("brown") cube([1, 1, 1],center=true);
    translate([11, 7, 0]) color("brown") cube([1, 1, 1],center=true);
    translate([11, 7, 1]) color("brown") cube([1, 1, 1],center=true);
    translate([11, 7, 2]) color("brown") cube([1, 1, 1],center=true);
    translate([11, 7, 3]) color("brown") cube([1, 1, 1],center=true);
    translate([11, 7, 4]) color("brown") cube([1, 1, 1],center=true);
    translate([11, 8, 0]) color("brown") cube([1, 1, 1],center=true);
    translate([11, 8, 1]) color("brown") cube([1, 1, 1],center=true);
    translate([11, 8, 2]) color("brown") cube([1, 1, 1],center=true);
    translate([11, 8, 3]) color("brown") cube([1, 1, 1],center=true);
    translate([11, 8, 4]) color("brown") cube([1, 1, 1],center=true);
    translate([11, 9, 0]) color("brown") cube([1, 1, 1],center=true);
    translate([11, 9, 1]) color("brown") cube([1, 1, 1],center=true);
    translate([11, 9, 2]) color("brown") cube([1, 1, 1],center=true);
    translate([11, 9, 3]) color("brown") cube([1, 1, 1],center=true);
    translate([11, 9, 4]) color("brown") cube([1, 1, 1],center=true);
    translate([11, 10, 0]) color("brown") cube([1, 1, 1],center=true);
    translate([11, 10, 1]) color("brown") cube([1, 1, 1],center=true);
    translate([11, 10, 2]) color("brown") cube([1, 1, 1],center=true);
    translate([11, 10, 3]) color("brown") cube([1, 1, 1],center=true);
    translate([11, 10, 4]) color("brown") cube([1, 1, 1],center=true);
    translate([11, 11, 0]) color("brown") cube([1, 1, 1],center=true);
    translate([11, 11, 1]) color("brown") cube([1, 1, 1],center=true);
    translate([11, 11, 2]) color("brown") cube([1, 1, 1],center=true);
    translate([11, 11, 3]) color("brown") cube([1, 1, 1],center=true);
    translate([11, 11, 4]) color("brown") cube([1, 1, 1],center=true);
    translate([11, 12, 0]) color("brown") cube([1, 1, 1],center=true);
    translate([11, 12, 1]) color("brown") cube([1, 1, 1],center=true);
    translate([11, 12, 2]) color("brown") cube([1, 1, 1],center=true);
    translate([11, 13, 0]) color("brown") cube([1, 1, 1],center=true);
    translate([11, 13, 1]) color("brown") cube([1, 1, 1],center=true);
    translate([11, 13, 2]) color("brown") cube([1, 1, 1],center=true);
    translate([11, 14, 0]) color("brown") cube([1, 1, 1],center=true);
    translate([11, 14, 1]) color("brown") cube([1, 1, 1],center=true);
    translate([11, 14, 2]) color("brown") cube([1, 1, 1],center=true);
    translate([11, 15, 0]) color("brown") cube([1, 1, 1],center=true);
    translate([11, 15, 1]) color("brown") cube([1, 1, 1],center=true);
    translate([11, 15, 2]) color("brown") cube([1, 1, 1],center=true);
    translate([12, 0, 0]) color("brown") cube([1, 1, 1],center=true);
    translate([12, 0, 1]) color("brown") cube([1, 1, 1],center=true);
    translate([12, 0, 2]) color("brown") cube([1, 1, 1],center=true);
    translate([12, 1, 0]) color("brown") cube([1, 1, 1],center=true);
    translate([12, 1, 1]) color("brown") cube([1, 1, 1],center=true);
    translate([12, 1, 2]) color("brown") cube([1, 1, 1],center=true);
    translate([12, 2, 0]) color("brown") cube([1, 1, 1],center=true);
    translate([12, 2, 1]) color("brown") cube([1, 1, 1],center=true);
    translate([12, 2, 2]) color("brown") cube([1, 1, 1],center=true);
    translate([12, 3, 0]) color("brown") cube([1, 1, 1],center=true);
    translate([12, 3, 1]) color("brown") cube([1, 1, 1],center=true);
    translate([12, 3, 2]) color("brown") cube([1, 1, 1],center=true);
    translate([12, 4, 0]) color("brown") cube([1, 1, 1],center=true);
    translate([12, 4, 1]) color("brown") cube([1, 1, 1],center=true);
    translate([12, 4, 2]) color("brown") cube([1, 1, 1],center=true);
    translate([12, 5, 0]) color("brown") cube([1, 1, 1],center=true);
    translate([12, 5, 1]) color("brown") cube([1, 1, 1],center=true);
    translate([12, 5, 2]) color("brown") cube([1, 1, 1],center=true);
    translate([12, 6, 0]) color("brown") cube([1, 1, 1],center=true);
    translate([12, 6, 1]) color("brown") cube([1, 1, 1],center=true);
    translate([12, 6, 2]) color("brown") cube([1, 1, 1],center=true);
    translate([12, 7, 0]) color("brown") cube([1, 1, 1],center=true);
    translate([12, 7, 1]) color("brown") cube([1, 1, 1],center=true);
    translate([12, 7, 2]) color("brown") cube([1, 1, 1],center=true);
    translate([12, 8, 0]) color("brown") cube([1, 1, 1],center=true);
    translate([12, 8, 1]) color("brown") cube([1, 1, 1],center=true);
    translate([12, 8, 2]) color("brown") cube([1, 1, 1],center=true);
    translate([12, 9, 0]) color("brown") cube([1, 1, 1],center=true);
    translate([12, 9, 1]) color("brown") cube([1, 1, 1],center=true);
    translate([12, 9, 2]) color("brown") cube([1, 1, 1],center=true);
    translate([12, 10, 0]) color("brown") cube([1, 1, 1],center=true);
    translate([12, 10, 1]) color("brown") cube([1, 1, 1],center=true);
    translate([12, 10, 2]) color("brown") cube([1, 1, 1],center=true);
    translate([12, 11, 0]) color("brown") cube([1, 1, 1],center=true);
    translate([12, 11, 1]) color("brown") cube([1, 1, 1],center=true);
    translate([12, 11, 2]) color("brown") cube([1, 1, 1],center=true);
    translate([12, 12, 0]) color("brown") cube([1, 1, 1],center=true);
    translate([12, 12, 1]) color("brown") cube([1, 1, 1],center=true);
    translate([12, 12, 2]) color("brown") cube([1, 1, 1],center=true);
    translate([12, 13, 0]) color("brown") cube([1, 1, 1],center=true);
    translate([12, 13, 1]) color("brown") cube([1, 1, 1],center=true);
    translate([12, 13, 2]) color("brown") cube([1, 1, 1],center=true);
    translate([12, 14, 0]) color("brown") cube([1, 1, 1],center=true);
    translate([12, 14, 1]) color("brown") cube([1, 1, 1],center=true);
    translate([12, 14, 2]) color("brown") cube([1, 1, 1],center=true);
    translate([12, 15, 0]) color("brown") cube([1, 1, 1],center=true);
    translate([12, 15, 1]) color("brown") cube([1, 1, 1],center=true);
    translate([12, 15, 2]) color("brown") cube([1, 1, 1],center=true);
    translate([13, 0, 0]) color("brown") cube([1, 1, 1],center=true);
    translate([13, 0, 1]) color("brown") cube([1, 1, 1],center=true);
    translate([13, 0, 2]) color("brown") cube([1, 1, 1],center=true);
    translate([13, 1, 0]) color("brown") cube([1, 1, 1],center=true);
    translate([13, 1, 1]) color("brown") cube([1, 1, 1],center=true);
    translate([13, 1, 2]) color("brown") cube([1, 1, 1],center=true);
    translate([13, 2, 0]) color("brown") cube([1, 1, 1],center=true);
    translate([13, 2, 1]) color("brown") cube([1, 1, 1],center=true);
    translate([13, 2, 2]) color("brown") cube([1, 1, 1],center=true);
    translate([13, 3, 0]) color("brown") cube([1, 1, 1],center=true);
    translate([13, 3, 1]) color("brown") cube([1, 1, 1],center=true);
    translate([13, 3, 2]) color("brown") cube([1, 1, 1],center=true);
    translate([13, 4, 0]) color("brown") cube([1, 1, 1],center=true);
    translate([13, 4, 1]) color("brown") cube([1, 1, 1],center=true);
    translate([13, 4, 2]) color("brown") cube([1, 1, 1],center=true);
    translate([13, 5, 0]) color("brown") cube([1, 1, 1],center=true);
    translate([13, 5, 1]) color("brown") cube([1, 1, 1],center=true);
    translate([13, 5, 2]) color("brown") cube([1, 1, 1],center=true);
    translate([13, 6, 0]) color("brown") cube([1, 1, 1],center=true);
    translate([13, 6, 1]) color("brown") cube([1, 1, 1],center=true);
    translate([13, 6, 2]) color("brown") cube([1, 1, 1],center=true);
    translate([13, 7, 0]) color("brown") cube([1, 1, 1],center=true);
    translate([13, 7, 1]) color("brown") cube([1, 1, 1],center=true);
    translate([13, 7, 2]) color("brown") cube([1, 1, 1],center=true);
    translate([13, 8, 0]) color("brown") cube([1, 1, 1],center=true);
    translate([13, 8, 1]) color("brown") cube([1, 1, 1],center=true);
    translate([13, 8, 2]) color("brown") cube([1, 1, 1],center=true);
    translate([13, 9, 0]) color("brown") cube([1, 1, 1],center=true);
    translate([13, 9, 1]) color("brown") cube([1, 1, 1],center=true);
    translate([13, 9, 2]) color("brown") cube([1, 1, 1],center=true);
    translate([13, 10, 0]) color("brown") cube([1, 1, 1],center=true);
    translate([13, 10, 1]) color("brown") cube([1, 1, 1],center=true);
    translate([13, 10, 2]) color("brown") cube([1, 1, 1],center=true);
    translate([13, 11, 0]) color("brown") cube([1, 1, 1],center=true);
    translate([13, 11, 1]) color("brown") cube([1, 1, 1],center=true);
    translate([13, 11, 2]) color("brown") cube([1, 1, 1],center=true);
    translate([13, 12, 0]) color("brown") cube([1, 1, 1],center=true);
    translate([13, 12, 1]) color("brown") cube([1, 1, 1],center=true);
    translate([13, 12, 2]) color("brown") cube([1, 1, 1],center=true);
    translate([13, 13, 0]) color("brown") cube([1, 1, 1],center=true);
    translate([13, 13, 1]) color("brown") cube([1, 1, 1],center=true);
    translate([13, 13, 2]) color("brown") cube([1, 1, 1],center=true);
    translate([13, 14, 0]) color("brown") cube([1, 1, 1],center=true);
    translate([13, 14, 1]) color("brown") cube([1, 1, 1],center=true);
    translate([13, 14, 2]) color("brown") cube([1, 1, 1],center=true);
    translate([13, 15, 0]) color("brown") cube([1, 1, 1],center=true);
    translate([13, 15, 1]) color("brown") cube([1, 1, 1],center=true);
    translate([13, 15, 2]) color("brown") cube([1, 1, 1],center=true);
    translate([14, 0, 0]) color("brown") cube([1, 1, 1],center=true);
    translate([14, 0, 1]) color("brown") cube([1, 1, 1],center=true);
    translate([14, 0, 2]) color("brown") cube([1, 1, 1],center=true);
    translate([14, 1, 0]) color("brown") cube([1, 1, 1],center=true);
    translate([14, 1, 1]) color("brown") cube([1, 1, 1],center=true);
    translate([14, 1, 2]) color("brown") cube([1, 1, 1],center=true);
    translate([14, 2, 0]) color("brown") cube([1, 1, 1],center=true);
    translate([14, 2, 1]) color("brown") cube([1, 1, 1],center=true);
    translate([14, 2, 2]) color("brown") cube([1, 1, 1],center=true);
    translate([14, 3, 0]) color("brown") cube([1, 1, 1],center=true);
    translate([14, 3, 1]) color("brown") cube([1, 1, 1],center=true);
    translate([14, 3, 2]) color("brown") cube([1, 1, 1],center=true);
    translate([14, 4, 0]) color("brown") cube([1, 1, 1],center=true);
    translate([14, 4, 1]) color("brown") cube([1, 1, 1],center=true);
    translate([14, 4, 2]) color("brown") cube([1, 1, 1],center=true);
    translate([14, 5, 0]) color("brown") cube([1, 1, 1],center=true);
    translate([14, 5, 1]) color("brown") cube([1, 1, 1],center=true);
    translate([14, 5, 2]) color("brown") cube([1, 1, 1],center=true);
    translate([14, 6, 0]) color("brown") cube([1, 1, 1],center=true);
    translate([14, 6, 1]) color("brown") cube([1, 1, 1],center=true);
    translate([14, 6, 2]) color("brown") cube([1, 1, 1],center=true);
    translate([14, 7, 0]) color("brown") cube([1, 1, 1],center=true);
    translate([14, 7, 1]) color("brown") cube([1, 1, 1],center=true);
    translate([14, 7, 2]) color("brown") cube([1, 1, 1],center=true);
    translate([14, 8, 0]) color("brown") cube([1, 1, 1],center=true);
    translate([14, 8, 1]) color("brown") cube([1, 1, 1],center=true);
    translate([14, 8, 2]) color("brown") cube([1, 1, 1],center=true);
    translate([14, 9, 0]) color("brown") cube([1, 1, 1],center=true);
    translate([14, 9, 1]) color("brown") cube([1, 1, 1],center=true);
    translate([14, 9, 2]) color("brown") cube([1, 1, 1],center=true);
    translate([14, 10, 0]) color("brown") cube([1, 1, 1],center=true);
    translate([14, 10, 1]) color("brown") cube([1, 1, 1],center=true);
    translate([14, 10, 2]) color("brown") cube([1, 1, 1],center=true);
    translate([14, 11, 0]) color("brown") cube([1, 1, 1],center=true);
    translate([14, 11, 1]) color("brown") cube([1, 1, 1],center=true);
    translate([14, 11, 2]) color("brown") cube([1, 1, 1],center=true);
    translate([14, 12, 0]) color("brown") cube([1, 1, 1],center=true);
    translate([14, 12, 1]) color("brown") cube([1, 1, 1],center=true);
    translate([14, 12, 2]) color("brown") cube([1, 1, 1],center=true);
    translate([14, 13, 0]) color("brown") cube([1, 1, 1],center=true);
    translate([14, 13, 1]) color("brown") cube([1, 1, 1],center=true);
    translate([14, 13, 2]) color("brown") cube([1, 1, 1],center=true);
    translate([14, 14, 0]) color("brown") cube([1, 1, 1],center=true);
    translate([14, 14, 1]) color("brown") cube([1, 1, 1],center=true);
    translate([14, 14, 2]) color("brown") cube([1, 1, 1],center=true);
    translate([14, 15, 0]) color("brown") cube([1, 1, 1],center=true);
    translate([14, 15, 1]) color("brown") cube([1, 1, 1],center=true);
    translate([14, 15, 2]) color("brown") cube([1, 1, 1],center=true);
    translate([15, 0, 0]) color("brown") cube([1, 1, 1],center=true);
    translate([15, 0, 1]) color("brown") cube([1, 1, 1],center=true);
    translate([15, 0, 2]) color("brown") cube([1, 1, 1],center=true);
    translate([15, 1, 0]) color("brown") cube([1, 1, 1],center=true);
    translate([15, 1, 1]) color("brown") cube([1, 1, 1],center=true);
    translate([15, 1, 2]) color("brown") cube([1, 1, 1],center=true);
    translate([15, 2, 0]) color("brown") cube([1, 1, 1],center=true);
    translate([15, 2, 1]) color("brown") cube([1, 1, 1],center=true);
    translate([15, 2, 2]) color("brown") cube([1, 1, 1],center=true);
    translate([15, 3, 0]) color("brown") cube([1, 1, 1],center=true);
    translate([15, 3, 1]) color("brown") cube([1, 1, 1],center=true);
    translate([15, 3, 2]) color("brown") cube([1, 1, 1],center=true);
    translate([15, 4, 0]) color("brown") cube([1, 1, 1],center=true);
    translate([15, 4, 1]) color("brown") cube([1, 1, 1],center=true);
    translate([15, 4, 2]) color("brown") cube([1, 1, 1],center=true);
    translate([15, 5, 0]) color("brown") cube([1, 1, 1],center=true);
    translate([15, 5, 1]) color("brown") cube([1, 1, 1],center=true);
    translate([15, 5, 2]) color("brown") cube([1, 1, 1],center=true);
    translate([15, 6, 0]) color("brown") cube([1, 1, 1],center=true);
    translate([15, 6, 1]) color("brown") cube([1, 1, 1],center=true);
    translate([15, 6, 2]) color("brown") cube([1, 1, 1],center=true);
    translate([15, 7, 0]) color("brown") cube([1, 1, 1],center=true);
    translate([15, 7, 1]) color("brown") cube([1, 1, 1],center=true);
    translate([15, 7, 2]) color("brown") cube([1, 1, 1],center=true);
    translate([15, 8, 0]) color("brown") cube([1, 1, 1],center=true);
    translate([15, 8, 1]) color("brown") cube([1, 1, 1],center=true);
    translate([15, 8, 2]) color("brown") cube([1, 1, 1],center=true);
    translate([15, 9, 0]) color("brown") cube([1, 1, 1],center=true);
    translate([15, 9, 1]) color("brown") cube([1, 1, 1],center=true);
    translate([15, 9, 2]) color("brown") cube([1, 1, 1],center=true);
    translate([15, 10, 0]) color("brown") cube([1, 1, 1],center=true);
    translate([15, 10, 1]) color("brown") cube([1, 1, 1],center=true);
    translate([15, 10, 2]) color("brown") cube([1, 1, 1],center=true);
    translate([15, 11, 0]) color("brown") cube([1, 1, 1],center=true);
    translate([15, 11, 1]) color("brown") cube([1, 1, 1],center=true);
    translate([15, 11, 2]) color("brown") cube([1, 1, 1],center=true);
    translate([15, 12, 0]) color("brown") cube([1, 1, 1],center=true);
    translate([15, 12, 1]) color("brown") cube([1, 1, 1],center=true);
    translate([15, 12, 2]) color("brown") cube([1, 1, 1],center=true);
    translate([15, 13, 0]) color("brown") cube([1, 1, 1],center=true);
    translate([15, 13, 1]) color("brown") cube([1, 1, 1],center=true);
    translate([15, 13, 2]) color("brown") cube([1, 1, 1],center=true);
    translate([15, 14, 0]) color("brown") cube([1, 1, 1],center=true);
    translate([15, 14, 1]) color("brown") cube([1, 1, 1],center=true);
    translate([15, 14, 2]) color("brown") cube([1, 1, 1],center=true);
    translate([15, 15, 0]) color("brown") cube([1, 1, 1],center=true);
    translate([15, 15, 1]) color("brown") cube([1, 1, 1],center=true);
    translate([15, 15, 2]) color("brown") cube([1, 1, 1],center=true);
}
